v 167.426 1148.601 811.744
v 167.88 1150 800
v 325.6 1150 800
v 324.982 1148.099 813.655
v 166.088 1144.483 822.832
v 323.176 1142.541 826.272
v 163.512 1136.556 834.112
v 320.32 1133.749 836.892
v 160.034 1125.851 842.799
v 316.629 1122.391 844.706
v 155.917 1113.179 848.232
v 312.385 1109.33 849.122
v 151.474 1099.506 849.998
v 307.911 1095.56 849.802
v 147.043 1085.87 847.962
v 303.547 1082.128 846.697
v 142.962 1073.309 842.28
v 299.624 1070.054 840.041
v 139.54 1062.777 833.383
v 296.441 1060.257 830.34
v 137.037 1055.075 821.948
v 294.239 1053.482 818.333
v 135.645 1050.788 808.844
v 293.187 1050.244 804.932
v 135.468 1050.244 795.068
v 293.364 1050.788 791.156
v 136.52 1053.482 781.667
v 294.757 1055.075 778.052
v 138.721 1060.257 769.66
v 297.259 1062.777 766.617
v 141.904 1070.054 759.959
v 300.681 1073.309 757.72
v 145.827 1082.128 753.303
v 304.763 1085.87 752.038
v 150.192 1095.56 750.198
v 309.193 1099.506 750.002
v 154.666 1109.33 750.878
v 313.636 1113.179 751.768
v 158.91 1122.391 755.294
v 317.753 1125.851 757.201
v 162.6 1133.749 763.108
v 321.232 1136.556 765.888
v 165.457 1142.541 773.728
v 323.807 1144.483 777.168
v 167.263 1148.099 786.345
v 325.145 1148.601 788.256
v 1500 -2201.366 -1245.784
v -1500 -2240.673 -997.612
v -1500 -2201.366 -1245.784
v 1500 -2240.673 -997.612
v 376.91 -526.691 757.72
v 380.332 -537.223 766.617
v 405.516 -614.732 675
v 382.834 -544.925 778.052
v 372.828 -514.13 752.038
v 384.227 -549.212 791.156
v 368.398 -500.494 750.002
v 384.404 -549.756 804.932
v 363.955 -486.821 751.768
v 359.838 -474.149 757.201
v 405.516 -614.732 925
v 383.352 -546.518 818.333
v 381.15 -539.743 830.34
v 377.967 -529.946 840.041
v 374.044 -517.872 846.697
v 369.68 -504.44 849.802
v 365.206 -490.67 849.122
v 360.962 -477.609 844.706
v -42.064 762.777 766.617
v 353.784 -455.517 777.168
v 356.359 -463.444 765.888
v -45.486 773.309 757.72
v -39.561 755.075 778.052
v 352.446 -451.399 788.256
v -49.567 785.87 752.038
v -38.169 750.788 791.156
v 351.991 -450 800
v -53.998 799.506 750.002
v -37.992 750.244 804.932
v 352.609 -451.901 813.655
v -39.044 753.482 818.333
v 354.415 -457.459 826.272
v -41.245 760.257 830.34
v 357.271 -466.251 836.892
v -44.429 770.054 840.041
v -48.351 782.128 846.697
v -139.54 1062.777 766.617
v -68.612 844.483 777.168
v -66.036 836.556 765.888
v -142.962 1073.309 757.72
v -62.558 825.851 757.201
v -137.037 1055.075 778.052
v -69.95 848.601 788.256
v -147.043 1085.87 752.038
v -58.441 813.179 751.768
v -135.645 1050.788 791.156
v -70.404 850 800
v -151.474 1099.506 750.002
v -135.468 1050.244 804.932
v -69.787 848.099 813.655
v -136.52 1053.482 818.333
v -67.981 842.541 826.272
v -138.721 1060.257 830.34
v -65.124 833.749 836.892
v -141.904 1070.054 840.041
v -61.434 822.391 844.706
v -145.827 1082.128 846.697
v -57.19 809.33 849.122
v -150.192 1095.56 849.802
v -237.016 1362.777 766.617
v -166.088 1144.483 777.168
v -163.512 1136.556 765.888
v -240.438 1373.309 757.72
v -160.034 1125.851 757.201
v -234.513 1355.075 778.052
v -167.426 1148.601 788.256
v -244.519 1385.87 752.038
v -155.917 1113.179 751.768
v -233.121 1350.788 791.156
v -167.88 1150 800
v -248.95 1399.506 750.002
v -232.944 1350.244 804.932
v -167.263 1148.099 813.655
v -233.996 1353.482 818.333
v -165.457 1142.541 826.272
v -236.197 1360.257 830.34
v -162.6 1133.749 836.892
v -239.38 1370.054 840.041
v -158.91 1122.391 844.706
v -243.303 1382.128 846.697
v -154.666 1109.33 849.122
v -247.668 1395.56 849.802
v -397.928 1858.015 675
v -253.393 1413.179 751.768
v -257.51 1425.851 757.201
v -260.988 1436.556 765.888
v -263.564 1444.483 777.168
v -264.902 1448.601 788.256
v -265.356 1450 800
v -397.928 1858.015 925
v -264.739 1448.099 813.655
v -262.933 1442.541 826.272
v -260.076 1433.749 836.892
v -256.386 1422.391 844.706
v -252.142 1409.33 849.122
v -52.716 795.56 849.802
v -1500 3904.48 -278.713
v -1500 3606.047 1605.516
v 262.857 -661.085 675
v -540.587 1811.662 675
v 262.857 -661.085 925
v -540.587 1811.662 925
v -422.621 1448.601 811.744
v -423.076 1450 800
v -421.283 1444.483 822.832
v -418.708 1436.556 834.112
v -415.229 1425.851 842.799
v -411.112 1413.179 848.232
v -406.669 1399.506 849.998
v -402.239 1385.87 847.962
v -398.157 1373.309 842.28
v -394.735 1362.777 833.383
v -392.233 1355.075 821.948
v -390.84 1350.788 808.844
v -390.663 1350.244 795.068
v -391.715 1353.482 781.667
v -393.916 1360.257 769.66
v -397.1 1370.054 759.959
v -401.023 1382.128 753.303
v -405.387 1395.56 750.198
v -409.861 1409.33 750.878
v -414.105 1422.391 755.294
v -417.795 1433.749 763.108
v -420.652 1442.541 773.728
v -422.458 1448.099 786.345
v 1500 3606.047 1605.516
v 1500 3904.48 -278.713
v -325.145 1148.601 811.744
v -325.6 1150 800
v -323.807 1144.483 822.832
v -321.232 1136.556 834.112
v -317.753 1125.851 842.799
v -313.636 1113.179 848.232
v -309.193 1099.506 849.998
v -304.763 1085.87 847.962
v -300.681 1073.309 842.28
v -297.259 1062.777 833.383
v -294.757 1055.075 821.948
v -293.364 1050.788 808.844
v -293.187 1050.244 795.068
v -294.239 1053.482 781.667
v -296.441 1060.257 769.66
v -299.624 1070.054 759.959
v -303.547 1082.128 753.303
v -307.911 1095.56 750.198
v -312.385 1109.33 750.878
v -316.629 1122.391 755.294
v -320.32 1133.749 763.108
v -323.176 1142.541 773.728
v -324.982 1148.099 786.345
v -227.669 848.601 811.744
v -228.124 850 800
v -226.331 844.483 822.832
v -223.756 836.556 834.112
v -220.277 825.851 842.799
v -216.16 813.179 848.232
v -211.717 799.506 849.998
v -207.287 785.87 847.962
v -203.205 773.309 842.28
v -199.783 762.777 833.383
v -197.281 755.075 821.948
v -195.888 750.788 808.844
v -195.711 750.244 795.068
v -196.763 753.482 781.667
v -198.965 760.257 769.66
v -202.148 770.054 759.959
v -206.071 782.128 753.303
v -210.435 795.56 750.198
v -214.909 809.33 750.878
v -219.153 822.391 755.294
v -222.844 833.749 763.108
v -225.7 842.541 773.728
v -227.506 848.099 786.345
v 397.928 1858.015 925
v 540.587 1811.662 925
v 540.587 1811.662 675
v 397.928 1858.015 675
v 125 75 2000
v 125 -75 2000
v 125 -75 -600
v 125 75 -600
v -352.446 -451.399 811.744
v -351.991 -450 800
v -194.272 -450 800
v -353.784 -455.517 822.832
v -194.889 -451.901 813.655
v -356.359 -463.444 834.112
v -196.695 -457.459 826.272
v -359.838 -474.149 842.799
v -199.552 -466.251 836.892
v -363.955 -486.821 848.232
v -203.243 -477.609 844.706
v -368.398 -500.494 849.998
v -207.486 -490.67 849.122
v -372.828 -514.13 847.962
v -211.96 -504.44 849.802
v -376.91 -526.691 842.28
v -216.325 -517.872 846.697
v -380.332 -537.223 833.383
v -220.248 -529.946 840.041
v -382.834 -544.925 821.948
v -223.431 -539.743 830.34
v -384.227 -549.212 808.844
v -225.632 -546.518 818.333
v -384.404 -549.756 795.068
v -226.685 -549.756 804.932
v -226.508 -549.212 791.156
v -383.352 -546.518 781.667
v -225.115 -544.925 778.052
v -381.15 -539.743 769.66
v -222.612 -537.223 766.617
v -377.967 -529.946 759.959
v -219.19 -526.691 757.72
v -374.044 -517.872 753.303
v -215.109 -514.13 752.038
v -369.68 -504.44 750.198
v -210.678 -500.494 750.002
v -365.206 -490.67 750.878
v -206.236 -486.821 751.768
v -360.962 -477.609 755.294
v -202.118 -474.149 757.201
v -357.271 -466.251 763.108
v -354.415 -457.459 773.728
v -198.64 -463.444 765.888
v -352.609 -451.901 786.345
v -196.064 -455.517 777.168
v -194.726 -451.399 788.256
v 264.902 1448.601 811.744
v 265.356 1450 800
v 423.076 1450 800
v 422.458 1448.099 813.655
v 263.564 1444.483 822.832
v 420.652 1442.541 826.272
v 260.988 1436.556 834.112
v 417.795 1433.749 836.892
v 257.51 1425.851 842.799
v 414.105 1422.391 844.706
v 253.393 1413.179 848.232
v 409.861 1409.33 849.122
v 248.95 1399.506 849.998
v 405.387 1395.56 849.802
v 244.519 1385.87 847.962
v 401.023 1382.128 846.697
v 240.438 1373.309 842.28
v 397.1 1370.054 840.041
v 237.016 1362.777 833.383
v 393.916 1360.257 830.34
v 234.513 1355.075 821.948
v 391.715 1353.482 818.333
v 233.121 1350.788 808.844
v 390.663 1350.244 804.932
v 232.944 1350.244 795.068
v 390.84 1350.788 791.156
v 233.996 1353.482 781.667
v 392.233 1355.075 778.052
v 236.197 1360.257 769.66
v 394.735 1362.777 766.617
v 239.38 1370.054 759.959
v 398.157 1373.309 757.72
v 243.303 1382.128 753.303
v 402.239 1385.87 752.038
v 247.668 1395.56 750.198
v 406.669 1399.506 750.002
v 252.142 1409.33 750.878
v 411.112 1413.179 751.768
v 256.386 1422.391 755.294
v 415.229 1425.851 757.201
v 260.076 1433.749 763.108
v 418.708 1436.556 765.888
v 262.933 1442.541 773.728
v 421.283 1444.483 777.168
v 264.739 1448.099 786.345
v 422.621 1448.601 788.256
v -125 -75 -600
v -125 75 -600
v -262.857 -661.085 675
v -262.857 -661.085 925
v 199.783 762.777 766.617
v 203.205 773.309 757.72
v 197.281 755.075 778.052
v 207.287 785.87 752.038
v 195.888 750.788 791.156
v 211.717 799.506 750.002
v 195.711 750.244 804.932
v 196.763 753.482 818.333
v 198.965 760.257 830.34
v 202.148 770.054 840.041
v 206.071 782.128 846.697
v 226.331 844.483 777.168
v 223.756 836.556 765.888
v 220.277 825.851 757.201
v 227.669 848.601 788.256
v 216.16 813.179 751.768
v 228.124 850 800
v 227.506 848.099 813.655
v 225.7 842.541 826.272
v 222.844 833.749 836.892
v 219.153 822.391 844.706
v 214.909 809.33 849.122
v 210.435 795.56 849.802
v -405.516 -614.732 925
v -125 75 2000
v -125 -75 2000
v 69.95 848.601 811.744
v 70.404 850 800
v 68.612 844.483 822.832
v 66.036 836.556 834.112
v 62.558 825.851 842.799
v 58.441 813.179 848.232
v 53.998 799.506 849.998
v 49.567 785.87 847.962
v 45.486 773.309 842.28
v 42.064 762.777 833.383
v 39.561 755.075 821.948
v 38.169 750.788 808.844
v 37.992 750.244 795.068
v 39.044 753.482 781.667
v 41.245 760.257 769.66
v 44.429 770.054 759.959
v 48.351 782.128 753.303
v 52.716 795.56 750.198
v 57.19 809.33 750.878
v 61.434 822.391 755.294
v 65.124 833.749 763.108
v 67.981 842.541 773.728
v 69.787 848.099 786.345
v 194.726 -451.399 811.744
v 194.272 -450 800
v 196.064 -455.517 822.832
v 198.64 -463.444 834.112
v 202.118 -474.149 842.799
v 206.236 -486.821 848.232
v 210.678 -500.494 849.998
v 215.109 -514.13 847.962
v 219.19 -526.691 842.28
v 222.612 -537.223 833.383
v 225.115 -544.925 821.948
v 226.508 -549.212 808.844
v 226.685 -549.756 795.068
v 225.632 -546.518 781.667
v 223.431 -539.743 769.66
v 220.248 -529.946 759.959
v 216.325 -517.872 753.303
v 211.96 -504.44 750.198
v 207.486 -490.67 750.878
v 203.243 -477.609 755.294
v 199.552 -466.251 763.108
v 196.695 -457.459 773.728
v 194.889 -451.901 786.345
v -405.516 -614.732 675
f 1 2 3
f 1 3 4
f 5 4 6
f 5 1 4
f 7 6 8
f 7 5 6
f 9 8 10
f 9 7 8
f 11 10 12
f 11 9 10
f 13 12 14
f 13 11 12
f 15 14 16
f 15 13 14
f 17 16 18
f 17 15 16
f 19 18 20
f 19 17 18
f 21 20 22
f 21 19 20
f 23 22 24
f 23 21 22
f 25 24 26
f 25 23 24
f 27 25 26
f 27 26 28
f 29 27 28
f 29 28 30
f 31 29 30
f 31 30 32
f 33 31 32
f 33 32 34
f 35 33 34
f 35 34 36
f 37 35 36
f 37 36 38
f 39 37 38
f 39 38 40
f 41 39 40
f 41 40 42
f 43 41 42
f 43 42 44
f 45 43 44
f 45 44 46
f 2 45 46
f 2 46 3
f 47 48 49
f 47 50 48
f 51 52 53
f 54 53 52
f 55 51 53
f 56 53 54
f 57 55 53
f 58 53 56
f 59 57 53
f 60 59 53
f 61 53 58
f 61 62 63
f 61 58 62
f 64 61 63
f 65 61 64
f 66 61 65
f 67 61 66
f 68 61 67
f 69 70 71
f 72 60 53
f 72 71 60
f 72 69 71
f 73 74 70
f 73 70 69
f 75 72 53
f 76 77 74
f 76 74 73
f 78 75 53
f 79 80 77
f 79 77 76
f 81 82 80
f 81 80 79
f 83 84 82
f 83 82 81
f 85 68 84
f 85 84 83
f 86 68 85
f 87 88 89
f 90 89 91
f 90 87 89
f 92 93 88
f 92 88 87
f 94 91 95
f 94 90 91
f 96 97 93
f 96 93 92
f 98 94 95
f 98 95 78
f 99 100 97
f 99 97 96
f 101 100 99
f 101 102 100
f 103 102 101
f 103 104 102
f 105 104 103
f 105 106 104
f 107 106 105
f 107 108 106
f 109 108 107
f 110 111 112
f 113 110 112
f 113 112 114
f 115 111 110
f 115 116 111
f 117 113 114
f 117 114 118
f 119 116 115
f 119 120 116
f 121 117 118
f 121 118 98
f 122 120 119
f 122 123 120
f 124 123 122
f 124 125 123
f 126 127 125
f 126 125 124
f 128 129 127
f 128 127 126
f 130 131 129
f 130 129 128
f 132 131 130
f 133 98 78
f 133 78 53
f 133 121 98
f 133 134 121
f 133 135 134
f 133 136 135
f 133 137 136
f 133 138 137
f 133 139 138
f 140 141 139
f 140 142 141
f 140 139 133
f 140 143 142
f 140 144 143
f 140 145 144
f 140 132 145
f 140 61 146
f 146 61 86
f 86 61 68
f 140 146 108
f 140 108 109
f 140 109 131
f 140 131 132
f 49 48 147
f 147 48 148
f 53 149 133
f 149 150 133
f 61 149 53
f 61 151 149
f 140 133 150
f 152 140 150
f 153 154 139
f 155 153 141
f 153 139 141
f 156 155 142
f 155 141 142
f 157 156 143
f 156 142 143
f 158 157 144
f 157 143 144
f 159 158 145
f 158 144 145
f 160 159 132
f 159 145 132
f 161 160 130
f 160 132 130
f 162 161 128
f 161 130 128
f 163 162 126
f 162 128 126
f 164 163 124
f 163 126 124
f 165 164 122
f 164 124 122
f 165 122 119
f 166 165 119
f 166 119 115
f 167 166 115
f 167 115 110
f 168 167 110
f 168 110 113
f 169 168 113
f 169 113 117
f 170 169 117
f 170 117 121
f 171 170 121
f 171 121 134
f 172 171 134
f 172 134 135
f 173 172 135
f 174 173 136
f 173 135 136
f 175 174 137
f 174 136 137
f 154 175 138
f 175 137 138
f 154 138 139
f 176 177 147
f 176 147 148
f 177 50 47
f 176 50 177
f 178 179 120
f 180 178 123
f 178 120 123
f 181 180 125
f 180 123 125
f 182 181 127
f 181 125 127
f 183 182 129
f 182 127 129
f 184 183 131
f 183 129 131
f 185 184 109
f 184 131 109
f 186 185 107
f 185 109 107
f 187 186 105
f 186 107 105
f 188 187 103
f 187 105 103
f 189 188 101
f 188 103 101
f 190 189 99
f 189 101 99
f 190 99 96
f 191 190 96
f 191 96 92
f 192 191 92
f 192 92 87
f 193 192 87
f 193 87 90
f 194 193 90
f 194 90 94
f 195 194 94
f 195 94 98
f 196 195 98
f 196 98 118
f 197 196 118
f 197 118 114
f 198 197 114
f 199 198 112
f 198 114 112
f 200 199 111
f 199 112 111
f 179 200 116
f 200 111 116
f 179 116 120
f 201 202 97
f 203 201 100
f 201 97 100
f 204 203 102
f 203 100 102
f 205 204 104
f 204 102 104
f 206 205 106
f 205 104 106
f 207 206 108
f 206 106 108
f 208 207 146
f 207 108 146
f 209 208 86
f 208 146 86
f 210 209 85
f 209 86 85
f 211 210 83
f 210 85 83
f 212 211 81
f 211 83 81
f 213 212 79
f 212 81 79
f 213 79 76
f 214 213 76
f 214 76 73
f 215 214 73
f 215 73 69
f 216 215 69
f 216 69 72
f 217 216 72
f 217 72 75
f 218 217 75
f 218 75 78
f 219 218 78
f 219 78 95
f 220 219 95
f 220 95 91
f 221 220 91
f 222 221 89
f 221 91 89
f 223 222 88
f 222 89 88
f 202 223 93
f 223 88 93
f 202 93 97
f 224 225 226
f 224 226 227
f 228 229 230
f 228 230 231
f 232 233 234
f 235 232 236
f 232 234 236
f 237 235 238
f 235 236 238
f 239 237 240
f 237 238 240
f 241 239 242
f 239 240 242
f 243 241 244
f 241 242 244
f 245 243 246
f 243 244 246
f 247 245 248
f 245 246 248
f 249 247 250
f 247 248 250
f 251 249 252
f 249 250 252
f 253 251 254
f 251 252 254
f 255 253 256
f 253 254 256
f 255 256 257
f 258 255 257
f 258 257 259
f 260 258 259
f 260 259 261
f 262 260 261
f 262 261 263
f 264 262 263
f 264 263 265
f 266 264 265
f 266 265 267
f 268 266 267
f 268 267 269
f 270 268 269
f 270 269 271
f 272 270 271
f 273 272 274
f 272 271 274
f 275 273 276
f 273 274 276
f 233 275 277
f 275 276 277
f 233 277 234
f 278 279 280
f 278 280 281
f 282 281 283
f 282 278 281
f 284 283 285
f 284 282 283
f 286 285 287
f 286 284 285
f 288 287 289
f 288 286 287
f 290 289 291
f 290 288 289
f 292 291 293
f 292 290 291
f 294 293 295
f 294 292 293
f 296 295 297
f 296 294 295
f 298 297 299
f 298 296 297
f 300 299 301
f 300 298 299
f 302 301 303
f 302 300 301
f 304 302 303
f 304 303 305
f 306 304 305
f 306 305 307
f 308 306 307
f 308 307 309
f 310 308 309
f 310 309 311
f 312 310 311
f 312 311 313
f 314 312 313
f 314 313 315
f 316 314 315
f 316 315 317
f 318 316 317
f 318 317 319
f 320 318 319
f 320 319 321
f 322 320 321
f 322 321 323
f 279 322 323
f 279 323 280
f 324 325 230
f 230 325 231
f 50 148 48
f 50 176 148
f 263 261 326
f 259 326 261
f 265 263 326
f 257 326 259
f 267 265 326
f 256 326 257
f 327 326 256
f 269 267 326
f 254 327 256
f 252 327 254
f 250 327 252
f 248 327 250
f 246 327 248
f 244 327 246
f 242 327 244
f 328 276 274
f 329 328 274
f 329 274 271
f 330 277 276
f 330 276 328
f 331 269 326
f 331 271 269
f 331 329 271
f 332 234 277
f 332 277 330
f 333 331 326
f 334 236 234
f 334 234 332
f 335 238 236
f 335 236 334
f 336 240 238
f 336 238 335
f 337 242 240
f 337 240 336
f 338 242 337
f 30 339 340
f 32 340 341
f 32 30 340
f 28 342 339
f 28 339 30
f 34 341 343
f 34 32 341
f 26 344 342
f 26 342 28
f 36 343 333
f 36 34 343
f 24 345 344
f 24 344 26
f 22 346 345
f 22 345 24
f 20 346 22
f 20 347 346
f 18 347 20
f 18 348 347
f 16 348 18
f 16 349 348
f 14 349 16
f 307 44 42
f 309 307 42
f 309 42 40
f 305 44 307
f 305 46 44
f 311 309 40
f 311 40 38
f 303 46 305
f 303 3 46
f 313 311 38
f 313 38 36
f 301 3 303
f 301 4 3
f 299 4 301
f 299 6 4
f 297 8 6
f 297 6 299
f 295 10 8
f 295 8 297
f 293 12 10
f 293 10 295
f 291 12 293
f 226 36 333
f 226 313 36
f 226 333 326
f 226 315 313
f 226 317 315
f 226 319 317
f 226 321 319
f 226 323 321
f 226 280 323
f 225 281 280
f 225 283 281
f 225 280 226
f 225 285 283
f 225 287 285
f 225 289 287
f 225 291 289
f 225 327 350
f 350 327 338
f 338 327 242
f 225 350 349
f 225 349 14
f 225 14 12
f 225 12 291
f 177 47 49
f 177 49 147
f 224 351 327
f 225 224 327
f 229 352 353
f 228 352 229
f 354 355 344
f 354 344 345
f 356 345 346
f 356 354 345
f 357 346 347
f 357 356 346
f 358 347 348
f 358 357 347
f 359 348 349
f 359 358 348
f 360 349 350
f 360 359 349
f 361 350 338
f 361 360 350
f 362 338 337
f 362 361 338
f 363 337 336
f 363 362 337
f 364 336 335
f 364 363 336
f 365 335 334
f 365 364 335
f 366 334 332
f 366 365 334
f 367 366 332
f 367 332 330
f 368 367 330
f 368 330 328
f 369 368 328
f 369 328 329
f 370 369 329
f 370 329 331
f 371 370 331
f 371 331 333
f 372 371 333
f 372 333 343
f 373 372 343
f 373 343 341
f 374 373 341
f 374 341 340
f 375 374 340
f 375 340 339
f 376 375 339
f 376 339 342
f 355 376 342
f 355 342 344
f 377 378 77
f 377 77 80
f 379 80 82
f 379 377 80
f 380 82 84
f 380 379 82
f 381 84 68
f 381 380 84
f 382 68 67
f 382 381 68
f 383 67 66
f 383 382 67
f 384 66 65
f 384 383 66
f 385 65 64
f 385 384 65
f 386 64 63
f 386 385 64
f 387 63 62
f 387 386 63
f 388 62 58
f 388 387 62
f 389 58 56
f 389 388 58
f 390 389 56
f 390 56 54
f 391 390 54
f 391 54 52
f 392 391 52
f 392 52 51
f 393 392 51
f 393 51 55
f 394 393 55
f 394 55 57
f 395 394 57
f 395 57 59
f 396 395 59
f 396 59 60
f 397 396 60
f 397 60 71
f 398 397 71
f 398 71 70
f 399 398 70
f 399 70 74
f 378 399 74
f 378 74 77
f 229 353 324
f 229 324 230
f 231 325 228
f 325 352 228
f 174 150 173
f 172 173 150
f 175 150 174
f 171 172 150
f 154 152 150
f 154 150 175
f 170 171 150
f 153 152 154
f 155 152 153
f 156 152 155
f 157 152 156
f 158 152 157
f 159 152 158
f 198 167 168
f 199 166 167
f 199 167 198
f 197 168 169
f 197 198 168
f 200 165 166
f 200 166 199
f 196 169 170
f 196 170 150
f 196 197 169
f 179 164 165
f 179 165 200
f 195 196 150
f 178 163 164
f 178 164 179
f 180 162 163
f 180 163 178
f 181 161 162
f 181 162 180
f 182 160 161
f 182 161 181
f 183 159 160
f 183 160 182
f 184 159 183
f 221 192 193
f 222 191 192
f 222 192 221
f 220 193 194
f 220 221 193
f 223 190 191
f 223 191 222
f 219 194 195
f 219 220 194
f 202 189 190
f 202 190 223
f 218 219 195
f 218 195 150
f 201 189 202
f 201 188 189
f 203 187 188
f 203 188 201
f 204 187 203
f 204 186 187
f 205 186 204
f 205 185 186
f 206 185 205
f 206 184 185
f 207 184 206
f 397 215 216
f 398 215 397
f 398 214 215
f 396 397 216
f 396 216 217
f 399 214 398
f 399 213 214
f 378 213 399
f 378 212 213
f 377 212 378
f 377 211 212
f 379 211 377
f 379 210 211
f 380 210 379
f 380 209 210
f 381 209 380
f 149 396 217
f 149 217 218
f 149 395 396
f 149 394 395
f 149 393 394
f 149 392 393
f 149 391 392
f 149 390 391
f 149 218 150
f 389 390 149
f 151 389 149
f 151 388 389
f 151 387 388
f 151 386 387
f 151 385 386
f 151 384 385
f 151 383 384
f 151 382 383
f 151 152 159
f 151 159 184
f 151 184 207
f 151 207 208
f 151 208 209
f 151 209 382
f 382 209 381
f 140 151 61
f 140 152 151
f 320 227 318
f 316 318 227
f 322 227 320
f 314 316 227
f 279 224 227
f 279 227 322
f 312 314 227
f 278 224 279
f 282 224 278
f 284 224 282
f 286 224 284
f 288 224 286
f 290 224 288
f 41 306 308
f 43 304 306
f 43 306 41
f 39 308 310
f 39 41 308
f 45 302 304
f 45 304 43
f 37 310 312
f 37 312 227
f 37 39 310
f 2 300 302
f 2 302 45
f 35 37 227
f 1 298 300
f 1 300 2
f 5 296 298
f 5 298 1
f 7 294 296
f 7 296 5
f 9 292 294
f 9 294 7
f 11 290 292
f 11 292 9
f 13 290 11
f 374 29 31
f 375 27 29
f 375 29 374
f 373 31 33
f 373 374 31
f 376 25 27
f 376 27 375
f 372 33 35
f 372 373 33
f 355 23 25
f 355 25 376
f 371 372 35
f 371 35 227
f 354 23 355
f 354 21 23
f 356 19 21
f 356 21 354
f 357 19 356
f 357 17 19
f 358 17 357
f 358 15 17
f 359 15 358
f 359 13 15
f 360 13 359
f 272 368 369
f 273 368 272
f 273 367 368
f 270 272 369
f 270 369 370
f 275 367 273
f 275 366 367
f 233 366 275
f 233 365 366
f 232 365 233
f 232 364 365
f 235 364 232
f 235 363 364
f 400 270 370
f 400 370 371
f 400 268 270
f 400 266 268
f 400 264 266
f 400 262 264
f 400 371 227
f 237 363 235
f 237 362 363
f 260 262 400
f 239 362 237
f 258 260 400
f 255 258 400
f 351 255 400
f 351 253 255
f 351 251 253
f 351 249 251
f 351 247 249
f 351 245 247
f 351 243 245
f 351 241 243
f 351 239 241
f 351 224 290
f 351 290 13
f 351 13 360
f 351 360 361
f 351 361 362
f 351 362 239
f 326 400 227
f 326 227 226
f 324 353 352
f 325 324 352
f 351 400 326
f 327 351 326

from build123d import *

# Parameters (mm, degrees)
F0_W          = 250
F0_H          = 150
F1_DEPTH      = 2000
F1_DEPTH_BACK = 600
F5_DEPTH      = 125
F6_DEPTH      = 125
F7_DEPTH      = 1500
F8_R          = 50
F9_DEPTH      = 1500.001
F9_DEPTH_BACK = 1500.001


with BuildPart() as f1:
    # F0 (on Top) → F1 (new body, two sides)
    with BuildSketch(Plane.XY) as f1_sk:
        Rectangle(F0_W, F0_H)
    extrude(amount=F1_DEPTH)
    extrude(f1_sk.sketch, amount=-F1_DEPTH_BACK)


with BuildPart() as f5:
    # F4 (on line) → F5 (new body, symmetric)
    with BuildSketch(Plane.XY.offset(800)):
        Polygon((-405.5158482545, -614.7322103396), (-262.8573708102, -661.0847594958), (0, 147.9070432719), (-78.8596668179, 390.6121415844), align=None)
        Polygon((-78.8596668179, 390.6121415844), (0, 147.9070432719), (78.8596668179, 390.6121415844), (0, 633.3172398969), align=None)
        Polygon((0, 633.3172398969), (78.8596668179, 390.6121415844), (540.5868145647, 1811.6621828716), (397.9283371204, 1858.0147320278), align=None)
    extrude(amount=F5_DEPTH, both=True)


with BuildPart() as f6:
    # F4 (on line) → F6 (new body, symmetric)
    with BuildSketch(Plane.XY.offset(800)):
        Polygon((78.8596668179, 390.6121415844), (0, 147.9070432719), (262.8573708102, -661.0847594958), (405.5158482545, -614.7322103396), align=None)
        Polygon((-540.5868145647, 1811.6621828716), (-78.8596668179, 390.6121415844), (0, 633.3172398969), (-397.9283371204, 1858.0147320278), align=None)
        Polygon((-78.8596668179, 390.6121415844), (0, 147.9070432719), (78.8596668179, 390.6121415844), (0, 633.3172398969), align=None)
    extrude(amount=F6_DEPTH, both=True)


with BuildPart() as f7:
    # F2 (on Right) → F7 (new body, symmetric)
    with BuildSketch(Plane.YZ):
        Polygon((1796.8294191234, 800), (-2240.6731085289, -997.6119423165), (-2201.3664910063, -1245.7841582363), (3904.4795133214, -278.7131561331), (3606.0470017618, 1605.5155657552), align=None)
    extrude(amount=F7_DEPTH, both=True)


with BuildPart() as f9_tool:
    # F8 (on Right) → F9 (new body, two sides)
    with BuildSketch(Plane.YZ) as f9_sk:
        with Locations((-500, 800)):
            Circle(F8_R)
        with Locations((800, 800)):
            Circle(F8_R)
        with Locations((1100, 800)):
            Circle(F8_R)
        with Locations((1400, 800)):
            Circle(F8_R)
    extrude(amount=-F9_DEPTH)
    extrude(f9_sk.sketch, amount=F9_DEPTH_BACK)


with BuildPart() as f5_1:
    add(f5.part)

    # F9: cut by f9_tool
    add(f9_tool.part, mode=Mode.SUBTRACT)


with BuildPart() as f6_1:
    add(f6.part)

    # F9: cut by f9_tool
    add(f9_tool.part, mode=Mode.SUBTRACT)


solid = Compound([f1.part, f7.part, f5_1.part, f6_1.part])
